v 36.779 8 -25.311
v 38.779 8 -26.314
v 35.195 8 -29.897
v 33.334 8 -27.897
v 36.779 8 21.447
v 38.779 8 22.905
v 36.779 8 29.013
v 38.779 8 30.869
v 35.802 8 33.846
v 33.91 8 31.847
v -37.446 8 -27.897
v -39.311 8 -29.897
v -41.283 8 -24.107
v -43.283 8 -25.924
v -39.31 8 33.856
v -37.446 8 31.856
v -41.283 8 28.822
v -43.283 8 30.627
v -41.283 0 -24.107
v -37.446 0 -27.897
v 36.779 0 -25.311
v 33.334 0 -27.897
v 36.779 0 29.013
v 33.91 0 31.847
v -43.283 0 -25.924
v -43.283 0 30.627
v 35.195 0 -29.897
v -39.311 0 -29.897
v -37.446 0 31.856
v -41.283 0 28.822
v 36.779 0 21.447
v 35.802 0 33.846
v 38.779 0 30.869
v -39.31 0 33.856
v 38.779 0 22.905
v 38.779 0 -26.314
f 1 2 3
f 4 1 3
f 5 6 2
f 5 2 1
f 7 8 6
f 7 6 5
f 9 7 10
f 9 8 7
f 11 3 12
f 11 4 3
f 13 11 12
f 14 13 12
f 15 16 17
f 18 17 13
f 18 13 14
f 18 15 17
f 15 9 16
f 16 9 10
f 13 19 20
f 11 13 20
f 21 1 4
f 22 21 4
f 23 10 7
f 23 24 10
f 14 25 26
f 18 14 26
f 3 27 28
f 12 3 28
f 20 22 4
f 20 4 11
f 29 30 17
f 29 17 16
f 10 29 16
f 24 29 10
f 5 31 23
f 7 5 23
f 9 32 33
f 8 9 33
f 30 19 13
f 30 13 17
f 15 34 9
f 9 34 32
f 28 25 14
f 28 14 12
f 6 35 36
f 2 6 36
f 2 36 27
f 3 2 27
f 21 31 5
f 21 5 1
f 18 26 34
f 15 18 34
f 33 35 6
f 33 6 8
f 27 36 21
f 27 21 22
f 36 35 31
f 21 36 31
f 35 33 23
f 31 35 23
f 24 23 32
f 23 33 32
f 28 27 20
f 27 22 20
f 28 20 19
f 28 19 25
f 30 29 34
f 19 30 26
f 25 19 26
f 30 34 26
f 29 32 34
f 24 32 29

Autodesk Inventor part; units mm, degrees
ref_plane "YZ Plane" through (0, 0, 0) normal (1, 0, 0) x (0, 1, 0)
ref_plane "XZ Plane" through (0, 0, 0) normal (0, 1, 0) x (-1, 0, 0)
ref_plane "XY Plane" through (0, 0, 0) normal (0, 0, 1) x (1, 0, 0)
sketch "Sketch1" plane through (0, 0, 0) normal (0, 1, 0) x (-1, 0, 0)
  line L0 (-35.1948, -29.8974) -> (39.3106, -29.8974)
  line L1 (43.2831, -25.9239) -> (39.3106, -29.8974)
  line L2 (-35.1948, -29.8974) -> (39.3106, -29.8974)
  line L3 (39.3106, -29.8974) -> (43.2831, -25.9239)
  line L4 (43.2831, -25.9239) -> (43.2831, 30.6268)
  line L5 (43.2831, 30.6268) -> (39.3102, 33.8564)
  line L6 (39.3102, 33.8564) -> (-35.8021, 33.8465)
  line L7 (-38.7786, 22.9053) -> (-38.7786, 30.8692)
  line L8 (-35.8021, 33.8465) -> (-38.7786, 30.8692)
  line L9 (-38.7786, 30.8692) -> (-38.7786, -26.3136)
  line L10 (-38.7786, -26.3136) -> (-35.1948, -29.8974)
  line L11 (-35.1948, -29.8974) -> (-38.7786, -26.3136)
  line L12 (-33.3338, -27.8974) -> (37.4464, -27.8974)
  line L13 (41.2831, -24.1074) -> (37.4464, -27.8974)
  line L14 (-33.3338, -27.8974) -> (37.4464, -27.8974)
  line L15 (37.4464, -27.8974) -> (41.2831, -24.1074)
  line L16 (41.2831, -24.1074) -> (41.2831, 28.8221)
  line L17 (41.2831, 28.8221) -> (37.4463, 31.8562)
  line L18 (37.4463, 31.8562) -> (-33.9105, 31.8467)
  line L19 (-36.7786, 21.447) -> (-36.7786, 29.0134)
  line L20 (-33.9105, 31.8467) -> (-36.7786, 29.0134)
  line L21 (-36.7786, 29.0134) -> (-36.7786, -25.3109)
  line L22 (-36.7786, -25.3109) -> (-33.3338, -27.8974)
  line L23 (-33.3338, -27.8974) -> (-36.7786, -25.3109)
  dimension "d1" = 2
  dimension "d2" = 2
  dimension "d3" = 2
  dimension "d4" = 2
extrude "Extrusion1" add sketch "Sketch1" along normal blind 8
properties part number "Mash Tank Bottom"
